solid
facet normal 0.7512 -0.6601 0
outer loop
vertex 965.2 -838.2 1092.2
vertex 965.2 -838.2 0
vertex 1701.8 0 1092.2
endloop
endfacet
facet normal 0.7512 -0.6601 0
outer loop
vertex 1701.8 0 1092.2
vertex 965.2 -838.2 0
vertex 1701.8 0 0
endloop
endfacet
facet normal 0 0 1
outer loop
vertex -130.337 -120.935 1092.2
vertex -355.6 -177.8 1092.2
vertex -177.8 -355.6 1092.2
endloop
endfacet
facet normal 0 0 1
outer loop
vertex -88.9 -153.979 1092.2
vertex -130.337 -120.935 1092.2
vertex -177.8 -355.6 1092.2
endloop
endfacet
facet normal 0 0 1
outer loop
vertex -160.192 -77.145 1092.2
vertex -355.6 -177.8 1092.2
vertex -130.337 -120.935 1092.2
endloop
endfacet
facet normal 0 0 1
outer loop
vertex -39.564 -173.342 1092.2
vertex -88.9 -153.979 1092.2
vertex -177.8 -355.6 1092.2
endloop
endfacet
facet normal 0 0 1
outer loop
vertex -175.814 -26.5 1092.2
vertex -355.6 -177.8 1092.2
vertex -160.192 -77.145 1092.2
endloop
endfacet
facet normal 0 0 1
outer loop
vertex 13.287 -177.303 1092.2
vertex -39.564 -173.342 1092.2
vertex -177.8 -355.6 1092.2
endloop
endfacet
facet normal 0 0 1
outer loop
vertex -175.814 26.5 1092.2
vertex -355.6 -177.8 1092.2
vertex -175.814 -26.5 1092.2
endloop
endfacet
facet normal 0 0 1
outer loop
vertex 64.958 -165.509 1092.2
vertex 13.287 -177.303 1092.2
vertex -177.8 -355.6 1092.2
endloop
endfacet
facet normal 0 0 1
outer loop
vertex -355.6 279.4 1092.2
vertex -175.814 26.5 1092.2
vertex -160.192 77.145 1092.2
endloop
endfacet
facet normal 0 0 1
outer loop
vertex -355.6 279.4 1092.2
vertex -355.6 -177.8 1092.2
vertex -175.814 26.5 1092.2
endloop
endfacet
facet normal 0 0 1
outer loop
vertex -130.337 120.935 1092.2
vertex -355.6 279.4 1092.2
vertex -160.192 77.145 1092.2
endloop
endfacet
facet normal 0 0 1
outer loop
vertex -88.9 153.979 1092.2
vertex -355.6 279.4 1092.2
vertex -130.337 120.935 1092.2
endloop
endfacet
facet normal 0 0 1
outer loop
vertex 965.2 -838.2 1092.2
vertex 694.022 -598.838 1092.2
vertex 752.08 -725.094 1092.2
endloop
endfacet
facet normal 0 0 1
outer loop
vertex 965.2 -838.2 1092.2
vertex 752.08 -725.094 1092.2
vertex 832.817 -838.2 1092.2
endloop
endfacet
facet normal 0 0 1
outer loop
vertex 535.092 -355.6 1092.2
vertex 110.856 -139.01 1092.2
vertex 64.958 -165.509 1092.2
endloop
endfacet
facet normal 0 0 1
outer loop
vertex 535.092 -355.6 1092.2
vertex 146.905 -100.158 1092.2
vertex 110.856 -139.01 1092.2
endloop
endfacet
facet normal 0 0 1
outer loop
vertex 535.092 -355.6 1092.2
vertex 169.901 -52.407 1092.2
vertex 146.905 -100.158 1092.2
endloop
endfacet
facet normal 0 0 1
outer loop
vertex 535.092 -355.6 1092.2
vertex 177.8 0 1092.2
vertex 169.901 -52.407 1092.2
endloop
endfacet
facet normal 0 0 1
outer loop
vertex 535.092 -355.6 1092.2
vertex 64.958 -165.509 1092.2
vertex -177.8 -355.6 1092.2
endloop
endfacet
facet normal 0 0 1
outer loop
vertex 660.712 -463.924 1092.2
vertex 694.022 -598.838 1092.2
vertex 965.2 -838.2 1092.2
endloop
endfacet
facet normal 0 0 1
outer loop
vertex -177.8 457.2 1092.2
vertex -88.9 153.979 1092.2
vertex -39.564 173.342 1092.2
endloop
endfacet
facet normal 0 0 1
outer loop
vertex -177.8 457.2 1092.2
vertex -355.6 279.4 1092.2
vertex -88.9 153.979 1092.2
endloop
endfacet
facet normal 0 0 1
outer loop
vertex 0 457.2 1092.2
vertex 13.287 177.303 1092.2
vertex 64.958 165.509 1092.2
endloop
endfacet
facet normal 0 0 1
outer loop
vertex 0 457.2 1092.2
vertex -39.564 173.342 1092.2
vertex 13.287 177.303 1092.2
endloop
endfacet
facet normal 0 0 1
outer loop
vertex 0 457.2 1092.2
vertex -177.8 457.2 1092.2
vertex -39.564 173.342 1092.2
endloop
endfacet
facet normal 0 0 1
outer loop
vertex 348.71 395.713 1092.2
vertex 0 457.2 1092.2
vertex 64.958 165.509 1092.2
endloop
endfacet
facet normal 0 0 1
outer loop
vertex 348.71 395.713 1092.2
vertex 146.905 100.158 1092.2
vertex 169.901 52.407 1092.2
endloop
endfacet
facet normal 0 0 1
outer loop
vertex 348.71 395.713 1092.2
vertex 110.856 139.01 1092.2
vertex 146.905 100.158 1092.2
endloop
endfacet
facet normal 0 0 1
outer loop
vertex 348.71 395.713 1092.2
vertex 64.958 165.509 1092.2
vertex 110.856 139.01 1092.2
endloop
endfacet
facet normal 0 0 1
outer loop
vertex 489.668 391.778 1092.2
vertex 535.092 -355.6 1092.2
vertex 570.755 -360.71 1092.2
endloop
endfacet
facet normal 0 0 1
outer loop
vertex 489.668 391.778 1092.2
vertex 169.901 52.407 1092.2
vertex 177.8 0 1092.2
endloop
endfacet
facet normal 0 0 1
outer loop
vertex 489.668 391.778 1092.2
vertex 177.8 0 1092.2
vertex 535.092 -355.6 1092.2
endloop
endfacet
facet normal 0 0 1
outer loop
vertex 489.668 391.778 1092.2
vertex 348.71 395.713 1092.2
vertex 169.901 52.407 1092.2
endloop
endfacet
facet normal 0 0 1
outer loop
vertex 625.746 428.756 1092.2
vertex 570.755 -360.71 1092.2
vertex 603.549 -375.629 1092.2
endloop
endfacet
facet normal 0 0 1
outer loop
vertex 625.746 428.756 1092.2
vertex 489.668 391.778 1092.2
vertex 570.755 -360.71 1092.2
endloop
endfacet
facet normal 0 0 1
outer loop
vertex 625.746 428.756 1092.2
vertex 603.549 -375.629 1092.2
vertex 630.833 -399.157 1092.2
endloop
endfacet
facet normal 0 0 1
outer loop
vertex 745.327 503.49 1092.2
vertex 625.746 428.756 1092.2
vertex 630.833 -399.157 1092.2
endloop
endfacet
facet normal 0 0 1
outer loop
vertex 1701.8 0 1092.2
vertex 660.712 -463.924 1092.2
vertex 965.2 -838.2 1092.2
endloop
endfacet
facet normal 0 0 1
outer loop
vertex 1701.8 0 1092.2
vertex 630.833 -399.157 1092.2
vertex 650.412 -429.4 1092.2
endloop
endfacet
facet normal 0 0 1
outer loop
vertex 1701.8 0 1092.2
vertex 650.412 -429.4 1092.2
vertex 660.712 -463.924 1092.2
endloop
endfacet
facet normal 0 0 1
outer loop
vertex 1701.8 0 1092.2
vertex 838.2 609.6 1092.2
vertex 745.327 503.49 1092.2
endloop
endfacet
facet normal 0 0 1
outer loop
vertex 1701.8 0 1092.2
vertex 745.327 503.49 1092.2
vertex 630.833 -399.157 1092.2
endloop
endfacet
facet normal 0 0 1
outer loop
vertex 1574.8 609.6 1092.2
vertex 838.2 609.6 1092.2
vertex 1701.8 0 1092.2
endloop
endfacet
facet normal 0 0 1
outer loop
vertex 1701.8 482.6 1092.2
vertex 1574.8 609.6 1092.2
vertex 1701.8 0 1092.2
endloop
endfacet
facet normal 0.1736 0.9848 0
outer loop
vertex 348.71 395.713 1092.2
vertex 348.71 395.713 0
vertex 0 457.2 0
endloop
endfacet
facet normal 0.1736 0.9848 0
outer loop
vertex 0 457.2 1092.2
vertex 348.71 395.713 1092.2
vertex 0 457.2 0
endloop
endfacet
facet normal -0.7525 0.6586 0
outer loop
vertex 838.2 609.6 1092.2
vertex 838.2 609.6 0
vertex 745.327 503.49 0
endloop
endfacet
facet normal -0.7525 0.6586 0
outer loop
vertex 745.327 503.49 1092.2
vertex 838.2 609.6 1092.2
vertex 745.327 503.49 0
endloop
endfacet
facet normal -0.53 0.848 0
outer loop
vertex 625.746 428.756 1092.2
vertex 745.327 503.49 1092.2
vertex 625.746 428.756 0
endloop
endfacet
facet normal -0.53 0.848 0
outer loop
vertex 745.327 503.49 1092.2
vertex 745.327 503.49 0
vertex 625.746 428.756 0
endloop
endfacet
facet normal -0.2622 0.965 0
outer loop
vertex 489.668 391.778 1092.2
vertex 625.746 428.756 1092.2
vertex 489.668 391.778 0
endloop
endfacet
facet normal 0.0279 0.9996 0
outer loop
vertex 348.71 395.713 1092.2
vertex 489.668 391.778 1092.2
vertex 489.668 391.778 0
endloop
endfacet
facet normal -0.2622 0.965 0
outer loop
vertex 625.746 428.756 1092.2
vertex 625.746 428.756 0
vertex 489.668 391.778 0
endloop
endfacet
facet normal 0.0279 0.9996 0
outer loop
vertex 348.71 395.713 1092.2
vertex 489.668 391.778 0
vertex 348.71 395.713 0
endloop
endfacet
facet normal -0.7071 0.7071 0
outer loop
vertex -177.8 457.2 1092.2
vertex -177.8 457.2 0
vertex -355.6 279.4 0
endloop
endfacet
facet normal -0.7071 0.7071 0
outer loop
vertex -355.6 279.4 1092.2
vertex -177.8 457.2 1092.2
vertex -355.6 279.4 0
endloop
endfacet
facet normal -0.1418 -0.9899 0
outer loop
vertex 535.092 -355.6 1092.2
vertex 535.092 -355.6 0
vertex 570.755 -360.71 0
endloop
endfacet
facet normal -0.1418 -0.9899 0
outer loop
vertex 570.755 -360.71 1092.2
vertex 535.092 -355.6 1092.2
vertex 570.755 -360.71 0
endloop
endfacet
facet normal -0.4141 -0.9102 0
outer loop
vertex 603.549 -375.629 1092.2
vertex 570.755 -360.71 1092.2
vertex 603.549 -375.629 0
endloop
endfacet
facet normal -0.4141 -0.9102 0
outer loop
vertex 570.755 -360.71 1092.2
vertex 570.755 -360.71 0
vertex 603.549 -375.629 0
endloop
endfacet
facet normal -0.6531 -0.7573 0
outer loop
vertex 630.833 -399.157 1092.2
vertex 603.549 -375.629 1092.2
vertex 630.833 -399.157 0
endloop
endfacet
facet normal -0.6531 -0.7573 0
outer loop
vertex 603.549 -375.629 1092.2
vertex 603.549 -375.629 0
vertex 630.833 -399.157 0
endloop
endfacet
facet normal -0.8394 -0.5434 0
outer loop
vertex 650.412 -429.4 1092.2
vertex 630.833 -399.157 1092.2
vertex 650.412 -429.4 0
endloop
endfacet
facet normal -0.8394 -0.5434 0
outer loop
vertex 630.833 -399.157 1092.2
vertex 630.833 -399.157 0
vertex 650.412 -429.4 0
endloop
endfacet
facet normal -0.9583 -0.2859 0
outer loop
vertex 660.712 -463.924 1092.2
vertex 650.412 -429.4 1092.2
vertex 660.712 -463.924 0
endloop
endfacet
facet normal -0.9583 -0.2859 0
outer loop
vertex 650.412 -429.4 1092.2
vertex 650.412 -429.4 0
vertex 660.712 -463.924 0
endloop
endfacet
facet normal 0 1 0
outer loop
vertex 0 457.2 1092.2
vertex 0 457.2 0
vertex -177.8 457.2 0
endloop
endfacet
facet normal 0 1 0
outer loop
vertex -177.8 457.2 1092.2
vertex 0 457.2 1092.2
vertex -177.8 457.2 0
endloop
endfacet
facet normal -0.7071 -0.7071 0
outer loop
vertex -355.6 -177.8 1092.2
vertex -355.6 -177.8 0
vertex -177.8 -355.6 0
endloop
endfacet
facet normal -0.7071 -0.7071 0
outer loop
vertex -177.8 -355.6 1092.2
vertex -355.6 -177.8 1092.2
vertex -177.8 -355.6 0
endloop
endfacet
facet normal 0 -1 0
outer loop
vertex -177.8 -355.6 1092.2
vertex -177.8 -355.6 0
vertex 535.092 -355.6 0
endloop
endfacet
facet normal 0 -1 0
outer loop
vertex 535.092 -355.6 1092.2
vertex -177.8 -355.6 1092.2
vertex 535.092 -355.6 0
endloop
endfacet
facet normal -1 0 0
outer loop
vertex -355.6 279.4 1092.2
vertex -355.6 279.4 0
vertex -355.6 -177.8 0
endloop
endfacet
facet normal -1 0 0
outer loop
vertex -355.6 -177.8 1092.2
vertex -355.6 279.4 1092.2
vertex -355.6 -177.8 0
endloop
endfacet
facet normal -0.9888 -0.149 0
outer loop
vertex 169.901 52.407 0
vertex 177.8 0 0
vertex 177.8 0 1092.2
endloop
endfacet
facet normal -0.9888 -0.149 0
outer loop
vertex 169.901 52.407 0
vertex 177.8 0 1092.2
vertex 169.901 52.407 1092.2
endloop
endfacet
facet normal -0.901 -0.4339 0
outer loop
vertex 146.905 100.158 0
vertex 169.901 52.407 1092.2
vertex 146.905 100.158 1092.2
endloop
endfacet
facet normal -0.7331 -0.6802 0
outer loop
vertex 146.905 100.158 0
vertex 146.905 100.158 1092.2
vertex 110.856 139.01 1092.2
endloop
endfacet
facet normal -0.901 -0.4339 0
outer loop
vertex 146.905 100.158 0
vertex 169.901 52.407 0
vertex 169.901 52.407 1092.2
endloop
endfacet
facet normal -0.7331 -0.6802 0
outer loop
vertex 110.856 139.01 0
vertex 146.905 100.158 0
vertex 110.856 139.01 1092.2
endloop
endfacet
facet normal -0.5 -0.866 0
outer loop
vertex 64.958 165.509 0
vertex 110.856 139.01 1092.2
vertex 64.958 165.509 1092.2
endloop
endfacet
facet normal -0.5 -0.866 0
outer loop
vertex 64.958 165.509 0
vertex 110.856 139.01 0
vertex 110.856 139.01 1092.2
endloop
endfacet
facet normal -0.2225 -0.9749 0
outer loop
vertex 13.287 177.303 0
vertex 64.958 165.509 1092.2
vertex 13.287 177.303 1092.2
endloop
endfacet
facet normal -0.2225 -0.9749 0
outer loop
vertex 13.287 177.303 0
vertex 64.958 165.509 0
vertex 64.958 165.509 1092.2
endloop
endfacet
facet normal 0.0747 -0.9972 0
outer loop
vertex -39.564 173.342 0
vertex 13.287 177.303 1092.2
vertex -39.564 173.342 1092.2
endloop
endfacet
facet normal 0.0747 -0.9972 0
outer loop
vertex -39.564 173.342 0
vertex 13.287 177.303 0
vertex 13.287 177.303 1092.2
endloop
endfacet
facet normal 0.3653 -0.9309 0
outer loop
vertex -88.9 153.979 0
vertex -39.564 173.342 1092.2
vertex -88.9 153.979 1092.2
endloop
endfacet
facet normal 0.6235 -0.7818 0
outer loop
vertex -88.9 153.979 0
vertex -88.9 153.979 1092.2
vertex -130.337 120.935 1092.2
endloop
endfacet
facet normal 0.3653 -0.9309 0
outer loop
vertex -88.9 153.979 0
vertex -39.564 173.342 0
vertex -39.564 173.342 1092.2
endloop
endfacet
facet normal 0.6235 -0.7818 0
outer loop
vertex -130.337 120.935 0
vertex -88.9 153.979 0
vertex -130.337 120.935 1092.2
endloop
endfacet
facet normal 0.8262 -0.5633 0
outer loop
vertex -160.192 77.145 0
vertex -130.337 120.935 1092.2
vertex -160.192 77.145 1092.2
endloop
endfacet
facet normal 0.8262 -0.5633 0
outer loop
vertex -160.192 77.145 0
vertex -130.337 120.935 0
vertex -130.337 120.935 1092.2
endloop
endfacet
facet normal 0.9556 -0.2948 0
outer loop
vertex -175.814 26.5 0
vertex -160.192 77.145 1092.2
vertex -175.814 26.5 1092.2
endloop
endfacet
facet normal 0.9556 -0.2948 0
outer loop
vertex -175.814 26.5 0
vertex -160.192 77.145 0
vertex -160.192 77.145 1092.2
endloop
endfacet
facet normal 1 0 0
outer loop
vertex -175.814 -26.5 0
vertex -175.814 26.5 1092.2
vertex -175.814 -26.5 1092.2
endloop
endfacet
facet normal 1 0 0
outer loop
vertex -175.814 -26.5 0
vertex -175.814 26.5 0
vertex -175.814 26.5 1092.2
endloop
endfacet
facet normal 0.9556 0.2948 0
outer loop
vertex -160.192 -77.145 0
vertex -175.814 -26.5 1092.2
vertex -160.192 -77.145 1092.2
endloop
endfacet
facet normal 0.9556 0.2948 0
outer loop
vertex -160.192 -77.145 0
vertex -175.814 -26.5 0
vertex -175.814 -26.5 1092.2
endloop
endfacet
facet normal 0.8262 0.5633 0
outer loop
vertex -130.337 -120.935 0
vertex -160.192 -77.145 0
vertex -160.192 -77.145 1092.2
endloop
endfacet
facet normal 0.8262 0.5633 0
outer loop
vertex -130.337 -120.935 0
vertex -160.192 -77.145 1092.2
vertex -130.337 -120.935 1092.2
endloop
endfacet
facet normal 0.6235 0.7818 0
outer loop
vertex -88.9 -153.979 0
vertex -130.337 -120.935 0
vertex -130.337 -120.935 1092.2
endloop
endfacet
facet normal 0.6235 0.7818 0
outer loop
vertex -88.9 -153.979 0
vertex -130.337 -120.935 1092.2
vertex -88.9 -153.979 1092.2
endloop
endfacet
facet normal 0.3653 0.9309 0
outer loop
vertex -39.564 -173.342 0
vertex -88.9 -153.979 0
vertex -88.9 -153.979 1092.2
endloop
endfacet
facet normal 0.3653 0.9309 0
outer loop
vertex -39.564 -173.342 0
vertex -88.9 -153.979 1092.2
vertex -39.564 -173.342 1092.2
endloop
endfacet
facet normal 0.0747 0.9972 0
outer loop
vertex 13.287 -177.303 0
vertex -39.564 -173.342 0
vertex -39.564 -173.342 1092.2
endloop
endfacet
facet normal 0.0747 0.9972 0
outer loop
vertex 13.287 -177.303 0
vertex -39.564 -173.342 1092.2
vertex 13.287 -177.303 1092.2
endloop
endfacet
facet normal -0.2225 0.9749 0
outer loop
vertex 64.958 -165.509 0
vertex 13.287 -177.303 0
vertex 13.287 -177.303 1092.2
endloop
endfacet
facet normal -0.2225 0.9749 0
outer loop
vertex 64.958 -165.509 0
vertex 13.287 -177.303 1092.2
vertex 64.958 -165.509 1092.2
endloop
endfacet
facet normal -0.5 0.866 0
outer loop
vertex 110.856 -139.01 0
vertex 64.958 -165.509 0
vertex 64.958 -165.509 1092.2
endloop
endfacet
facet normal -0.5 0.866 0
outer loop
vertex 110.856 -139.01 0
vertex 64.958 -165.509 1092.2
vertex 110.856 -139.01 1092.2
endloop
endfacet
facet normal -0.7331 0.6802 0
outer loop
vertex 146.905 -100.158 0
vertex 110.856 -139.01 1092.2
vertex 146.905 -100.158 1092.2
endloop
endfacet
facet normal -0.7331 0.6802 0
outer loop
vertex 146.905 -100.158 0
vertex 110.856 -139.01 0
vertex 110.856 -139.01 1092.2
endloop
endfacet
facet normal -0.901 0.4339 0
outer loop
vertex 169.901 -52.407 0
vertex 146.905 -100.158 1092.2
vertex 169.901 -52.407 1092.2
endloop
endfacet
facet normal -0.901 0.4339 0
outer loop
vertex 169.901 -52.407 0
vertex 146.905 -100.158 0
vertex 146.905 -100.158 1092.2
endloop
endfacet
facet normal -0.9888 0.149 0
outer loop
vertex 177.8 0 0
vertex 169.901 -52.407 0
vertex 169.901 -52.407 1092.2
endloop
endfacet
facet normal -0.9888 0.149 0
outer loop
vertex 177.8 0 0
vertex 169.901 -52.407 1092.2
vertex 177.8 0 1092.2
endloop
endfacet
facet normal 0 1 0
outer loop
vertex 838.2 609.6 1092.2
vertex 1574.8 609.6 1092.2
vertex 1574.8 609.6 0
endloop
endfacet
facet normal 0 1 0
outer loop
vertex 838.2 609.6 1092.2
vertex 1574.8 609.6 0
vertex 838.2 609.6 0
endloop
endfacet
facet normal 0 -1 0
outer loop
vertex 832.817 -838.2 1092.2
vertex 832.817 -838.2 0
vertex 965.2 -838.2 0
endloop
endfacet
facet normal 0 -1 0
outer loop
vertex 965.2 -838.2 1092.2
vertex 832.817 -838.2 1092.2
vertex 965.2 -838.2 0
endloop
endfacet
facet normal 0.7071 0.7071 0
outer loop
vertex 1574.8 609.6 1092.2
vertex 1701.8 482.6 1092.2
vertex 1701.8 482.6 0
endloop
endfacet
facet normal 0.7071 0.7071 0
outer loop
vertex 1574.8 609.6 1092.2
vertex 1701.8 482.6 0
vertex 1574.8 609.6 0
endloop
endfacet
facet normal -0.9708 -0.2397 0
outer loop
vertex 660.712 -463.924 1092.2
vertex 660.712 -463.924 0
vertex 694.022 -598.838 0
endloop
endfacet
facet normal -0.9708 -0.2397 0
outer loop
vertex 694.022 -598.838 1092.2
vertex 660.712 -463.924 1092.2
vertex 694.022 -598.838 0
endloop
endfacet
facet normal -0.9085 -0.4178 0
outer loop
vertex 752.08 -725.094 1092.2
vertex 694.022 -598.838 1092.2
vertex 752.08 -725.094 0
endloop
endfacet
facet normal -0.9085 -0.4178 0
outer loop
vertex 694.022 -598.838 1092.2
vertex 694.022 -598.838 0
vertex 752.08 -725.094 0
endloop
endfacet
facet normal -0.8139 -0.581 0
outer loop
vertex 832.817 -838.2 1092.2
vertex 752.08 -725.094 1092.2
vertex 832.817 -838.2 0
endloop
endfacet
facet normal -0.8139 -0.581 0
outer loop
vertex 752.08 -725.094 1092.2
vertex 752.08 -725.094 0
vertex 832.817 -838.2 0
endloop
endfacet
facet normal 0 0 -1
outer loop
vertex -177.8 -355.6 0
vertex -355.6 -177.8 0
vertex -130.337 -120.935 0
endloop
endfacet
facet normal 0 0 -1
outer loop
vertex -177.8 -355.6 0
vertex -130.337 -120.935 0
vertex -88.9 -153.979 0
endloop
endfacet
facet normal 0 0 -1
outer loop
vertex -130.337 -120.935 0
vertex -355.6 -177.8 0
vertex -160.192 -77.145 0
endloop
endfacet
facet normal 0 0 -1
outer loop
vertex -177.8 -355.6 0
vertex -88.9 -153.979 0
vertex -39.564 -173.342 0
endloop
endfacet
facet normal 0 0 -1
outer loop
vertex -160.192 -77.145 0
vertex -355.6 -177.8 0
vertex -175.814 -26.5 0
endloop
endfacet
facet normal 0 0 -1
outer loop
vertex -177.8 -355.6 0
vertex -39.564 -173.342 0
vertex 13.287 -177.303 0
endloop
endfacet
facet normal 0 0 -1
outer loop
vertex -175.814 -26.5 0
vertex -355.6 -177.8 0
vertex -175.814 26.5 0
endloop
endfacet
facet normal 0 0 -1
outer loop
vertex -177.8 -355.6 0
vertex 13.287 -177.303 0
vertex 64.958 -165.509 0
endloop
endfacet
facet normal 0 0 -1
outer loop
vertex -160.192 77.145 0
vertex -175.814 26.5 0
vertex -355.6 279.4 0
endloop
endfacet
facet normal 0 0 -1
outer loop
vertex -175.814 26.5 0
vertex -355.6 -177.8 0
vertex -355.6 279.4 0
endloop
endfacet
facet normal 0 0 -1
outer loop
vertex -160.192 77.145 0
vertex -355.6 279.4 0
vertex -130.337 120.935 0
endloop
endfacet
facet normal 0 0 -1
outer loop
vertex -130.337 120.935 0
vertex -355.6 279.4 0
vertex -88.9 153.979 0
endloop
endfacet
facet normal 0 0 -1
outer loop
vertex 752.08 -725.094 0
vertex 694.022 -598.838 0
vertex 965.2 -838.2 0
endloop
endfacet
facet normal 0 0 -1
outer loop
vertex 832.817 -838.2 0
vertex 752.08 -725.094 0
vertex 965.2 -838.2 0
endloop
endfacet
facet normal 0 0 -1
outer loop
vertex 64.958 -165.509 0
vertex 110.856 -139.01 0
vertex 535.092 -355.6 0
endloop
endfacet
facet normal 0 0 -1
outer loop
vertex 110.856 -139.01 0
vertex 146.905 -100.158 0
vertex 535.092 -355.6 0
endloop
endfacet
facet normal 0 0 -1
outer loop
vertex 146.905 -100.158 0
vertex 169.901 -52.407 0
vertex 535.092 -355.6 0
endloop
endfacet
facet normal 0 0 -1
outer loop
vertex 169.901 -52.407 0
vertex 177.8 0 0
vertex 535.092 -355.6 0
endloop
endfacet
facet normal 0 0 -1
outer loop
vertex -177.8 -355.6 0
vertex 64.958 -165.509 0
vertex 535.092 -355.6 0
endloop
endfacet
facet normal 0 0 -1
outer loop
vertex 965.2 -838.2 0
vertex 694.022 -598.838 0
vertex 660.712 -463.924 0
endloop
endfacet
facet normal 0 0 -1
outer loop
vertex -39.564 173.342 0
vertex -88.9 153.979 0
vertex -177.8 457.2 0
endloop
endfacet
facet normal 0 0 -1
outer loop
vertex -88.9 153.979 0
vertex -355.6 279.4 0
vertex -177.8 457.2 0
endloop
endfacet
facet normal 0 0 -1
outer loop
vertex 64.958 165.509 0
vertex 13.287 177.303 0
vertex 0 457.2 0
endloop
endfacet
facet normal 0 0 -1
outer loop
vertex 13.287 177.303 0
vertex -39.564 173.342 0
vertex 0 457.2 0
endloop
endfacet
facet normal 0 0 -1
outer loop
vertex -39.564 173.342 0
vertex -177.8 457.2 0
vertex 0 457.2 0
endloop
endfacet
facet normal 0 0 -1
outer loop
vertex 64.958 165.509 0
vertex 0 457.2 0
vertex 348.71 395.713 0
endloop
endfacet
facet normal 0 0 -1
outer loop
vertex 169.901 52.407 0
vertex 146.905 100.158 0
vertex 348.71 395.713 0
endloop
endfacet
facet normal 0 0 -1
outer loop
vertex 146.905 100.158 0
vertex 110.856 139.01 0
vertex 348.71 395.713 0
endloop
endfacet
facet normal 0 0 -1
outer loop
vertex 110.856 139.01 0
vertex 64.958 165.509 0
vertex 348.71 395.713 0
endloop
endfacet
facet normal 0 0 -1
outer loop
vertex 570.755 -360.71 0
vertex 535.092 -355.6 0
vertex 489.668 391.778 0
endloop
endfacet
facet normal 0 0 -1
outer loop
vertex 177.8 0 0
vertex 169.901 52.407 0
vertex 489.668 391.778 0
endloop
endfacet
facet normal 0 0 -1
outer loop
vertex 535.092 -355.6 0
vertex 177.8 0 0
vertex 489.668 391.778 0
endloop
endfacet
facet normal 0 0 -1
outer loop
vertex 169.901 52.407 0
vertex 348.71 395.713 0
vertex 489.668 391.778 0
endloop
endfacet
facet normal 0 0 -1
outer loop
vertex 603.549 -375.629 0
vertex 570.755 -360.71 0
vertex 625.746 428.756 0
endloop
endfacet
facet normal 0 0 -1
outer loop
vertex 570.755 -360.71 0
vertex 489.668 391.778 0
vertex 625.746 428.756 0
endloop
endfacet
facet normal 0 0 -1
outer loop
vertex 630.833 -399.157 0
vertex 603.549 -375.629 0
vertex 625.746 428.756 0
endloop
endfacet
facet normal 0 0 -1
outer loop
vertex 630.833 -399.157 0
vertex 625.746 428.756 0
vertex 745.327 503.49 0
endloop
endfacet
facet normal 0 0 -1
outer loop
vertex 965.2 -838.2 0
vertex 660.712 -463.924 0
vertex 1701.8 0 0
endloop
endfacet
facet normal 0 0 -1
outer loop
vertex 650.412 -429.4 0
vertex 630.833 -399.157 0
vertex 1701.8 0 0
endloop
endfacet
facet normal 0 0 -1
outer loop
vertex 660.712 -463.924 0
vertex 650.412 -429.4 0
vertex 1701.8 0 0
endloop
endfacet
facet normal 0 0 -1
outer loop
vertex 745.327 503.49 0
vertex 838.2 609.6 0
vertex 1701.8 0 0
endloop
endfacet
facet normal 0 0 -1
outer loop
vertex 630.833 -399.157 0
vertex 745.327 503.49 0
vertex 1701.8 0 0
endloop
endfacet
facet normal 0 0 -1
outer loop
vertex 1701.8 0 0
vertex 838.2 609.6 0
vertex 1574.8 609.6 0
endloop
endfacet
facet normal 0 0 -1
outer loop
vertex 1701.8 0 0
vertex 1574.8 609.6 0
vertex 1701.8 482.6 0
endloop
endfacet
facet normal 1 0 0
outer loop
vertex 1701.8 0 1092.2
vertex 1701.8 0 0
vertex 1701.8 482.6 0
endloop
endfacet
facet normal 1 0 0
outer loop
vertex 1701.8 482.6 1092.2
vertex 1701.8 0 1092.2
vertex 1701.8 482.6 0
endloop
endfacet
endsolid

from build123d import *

# Parameters (mm, degrees)
SKETCH1_R           = 177.8
BOSS_EXTRUDE2_DEPTH = 1092.2


with BuildPart() as part:
    # Sketch1 → Boss-Extrude2 (new body)
    with BuildSketch(Plane.XY):
        with BuildLine():
            Line((-355.6, 279.4), (-355.6, -177.8))
            Line((-355.6, -177.8), (-177.8, -355.6))
            Line((-177.8, -355.6), (0, -355.6))
            Line((0, -355.6), (535.092306886, -355.6))
            ThreePointArc((535.092306886, -355.6), (618.029295725, -386.420709701), (660.711530918, -463.923529412))
            ThreePointArc((660.711530918, -463.923529412), (720.067018079, -663.338070349), (832.816911878, -838.2))
            Line((832.816911878, -838.2), (965.2, -838.2))
            Line((965.2, -838.2), (1701.8, 0))
            Line((1701.8, 0), (1701.8, 482.6))
            Line((1701.8, 482.6), (1574.8, 609.6))
            Line((1574.8, 609.6), (838.2, 609.6))
            ThreePointArc((838.2, 609.6), (625.746325122, 428.755865672), (348.709613385, 395.713086728))
            Line((348.709613385, 395.713086728), (0, 457.2))
            Line((0, 457.2), (-177.8, 457.2))
            Line((-177.8, 457.2), (-355.6, 279.4))
        make_face()
        Circle(SKETCH1_R, mode=Mode.SUBTRACT)
    extrude(amount=BOSS_EXTRUDE2_DEPTH)


solid = part.part
